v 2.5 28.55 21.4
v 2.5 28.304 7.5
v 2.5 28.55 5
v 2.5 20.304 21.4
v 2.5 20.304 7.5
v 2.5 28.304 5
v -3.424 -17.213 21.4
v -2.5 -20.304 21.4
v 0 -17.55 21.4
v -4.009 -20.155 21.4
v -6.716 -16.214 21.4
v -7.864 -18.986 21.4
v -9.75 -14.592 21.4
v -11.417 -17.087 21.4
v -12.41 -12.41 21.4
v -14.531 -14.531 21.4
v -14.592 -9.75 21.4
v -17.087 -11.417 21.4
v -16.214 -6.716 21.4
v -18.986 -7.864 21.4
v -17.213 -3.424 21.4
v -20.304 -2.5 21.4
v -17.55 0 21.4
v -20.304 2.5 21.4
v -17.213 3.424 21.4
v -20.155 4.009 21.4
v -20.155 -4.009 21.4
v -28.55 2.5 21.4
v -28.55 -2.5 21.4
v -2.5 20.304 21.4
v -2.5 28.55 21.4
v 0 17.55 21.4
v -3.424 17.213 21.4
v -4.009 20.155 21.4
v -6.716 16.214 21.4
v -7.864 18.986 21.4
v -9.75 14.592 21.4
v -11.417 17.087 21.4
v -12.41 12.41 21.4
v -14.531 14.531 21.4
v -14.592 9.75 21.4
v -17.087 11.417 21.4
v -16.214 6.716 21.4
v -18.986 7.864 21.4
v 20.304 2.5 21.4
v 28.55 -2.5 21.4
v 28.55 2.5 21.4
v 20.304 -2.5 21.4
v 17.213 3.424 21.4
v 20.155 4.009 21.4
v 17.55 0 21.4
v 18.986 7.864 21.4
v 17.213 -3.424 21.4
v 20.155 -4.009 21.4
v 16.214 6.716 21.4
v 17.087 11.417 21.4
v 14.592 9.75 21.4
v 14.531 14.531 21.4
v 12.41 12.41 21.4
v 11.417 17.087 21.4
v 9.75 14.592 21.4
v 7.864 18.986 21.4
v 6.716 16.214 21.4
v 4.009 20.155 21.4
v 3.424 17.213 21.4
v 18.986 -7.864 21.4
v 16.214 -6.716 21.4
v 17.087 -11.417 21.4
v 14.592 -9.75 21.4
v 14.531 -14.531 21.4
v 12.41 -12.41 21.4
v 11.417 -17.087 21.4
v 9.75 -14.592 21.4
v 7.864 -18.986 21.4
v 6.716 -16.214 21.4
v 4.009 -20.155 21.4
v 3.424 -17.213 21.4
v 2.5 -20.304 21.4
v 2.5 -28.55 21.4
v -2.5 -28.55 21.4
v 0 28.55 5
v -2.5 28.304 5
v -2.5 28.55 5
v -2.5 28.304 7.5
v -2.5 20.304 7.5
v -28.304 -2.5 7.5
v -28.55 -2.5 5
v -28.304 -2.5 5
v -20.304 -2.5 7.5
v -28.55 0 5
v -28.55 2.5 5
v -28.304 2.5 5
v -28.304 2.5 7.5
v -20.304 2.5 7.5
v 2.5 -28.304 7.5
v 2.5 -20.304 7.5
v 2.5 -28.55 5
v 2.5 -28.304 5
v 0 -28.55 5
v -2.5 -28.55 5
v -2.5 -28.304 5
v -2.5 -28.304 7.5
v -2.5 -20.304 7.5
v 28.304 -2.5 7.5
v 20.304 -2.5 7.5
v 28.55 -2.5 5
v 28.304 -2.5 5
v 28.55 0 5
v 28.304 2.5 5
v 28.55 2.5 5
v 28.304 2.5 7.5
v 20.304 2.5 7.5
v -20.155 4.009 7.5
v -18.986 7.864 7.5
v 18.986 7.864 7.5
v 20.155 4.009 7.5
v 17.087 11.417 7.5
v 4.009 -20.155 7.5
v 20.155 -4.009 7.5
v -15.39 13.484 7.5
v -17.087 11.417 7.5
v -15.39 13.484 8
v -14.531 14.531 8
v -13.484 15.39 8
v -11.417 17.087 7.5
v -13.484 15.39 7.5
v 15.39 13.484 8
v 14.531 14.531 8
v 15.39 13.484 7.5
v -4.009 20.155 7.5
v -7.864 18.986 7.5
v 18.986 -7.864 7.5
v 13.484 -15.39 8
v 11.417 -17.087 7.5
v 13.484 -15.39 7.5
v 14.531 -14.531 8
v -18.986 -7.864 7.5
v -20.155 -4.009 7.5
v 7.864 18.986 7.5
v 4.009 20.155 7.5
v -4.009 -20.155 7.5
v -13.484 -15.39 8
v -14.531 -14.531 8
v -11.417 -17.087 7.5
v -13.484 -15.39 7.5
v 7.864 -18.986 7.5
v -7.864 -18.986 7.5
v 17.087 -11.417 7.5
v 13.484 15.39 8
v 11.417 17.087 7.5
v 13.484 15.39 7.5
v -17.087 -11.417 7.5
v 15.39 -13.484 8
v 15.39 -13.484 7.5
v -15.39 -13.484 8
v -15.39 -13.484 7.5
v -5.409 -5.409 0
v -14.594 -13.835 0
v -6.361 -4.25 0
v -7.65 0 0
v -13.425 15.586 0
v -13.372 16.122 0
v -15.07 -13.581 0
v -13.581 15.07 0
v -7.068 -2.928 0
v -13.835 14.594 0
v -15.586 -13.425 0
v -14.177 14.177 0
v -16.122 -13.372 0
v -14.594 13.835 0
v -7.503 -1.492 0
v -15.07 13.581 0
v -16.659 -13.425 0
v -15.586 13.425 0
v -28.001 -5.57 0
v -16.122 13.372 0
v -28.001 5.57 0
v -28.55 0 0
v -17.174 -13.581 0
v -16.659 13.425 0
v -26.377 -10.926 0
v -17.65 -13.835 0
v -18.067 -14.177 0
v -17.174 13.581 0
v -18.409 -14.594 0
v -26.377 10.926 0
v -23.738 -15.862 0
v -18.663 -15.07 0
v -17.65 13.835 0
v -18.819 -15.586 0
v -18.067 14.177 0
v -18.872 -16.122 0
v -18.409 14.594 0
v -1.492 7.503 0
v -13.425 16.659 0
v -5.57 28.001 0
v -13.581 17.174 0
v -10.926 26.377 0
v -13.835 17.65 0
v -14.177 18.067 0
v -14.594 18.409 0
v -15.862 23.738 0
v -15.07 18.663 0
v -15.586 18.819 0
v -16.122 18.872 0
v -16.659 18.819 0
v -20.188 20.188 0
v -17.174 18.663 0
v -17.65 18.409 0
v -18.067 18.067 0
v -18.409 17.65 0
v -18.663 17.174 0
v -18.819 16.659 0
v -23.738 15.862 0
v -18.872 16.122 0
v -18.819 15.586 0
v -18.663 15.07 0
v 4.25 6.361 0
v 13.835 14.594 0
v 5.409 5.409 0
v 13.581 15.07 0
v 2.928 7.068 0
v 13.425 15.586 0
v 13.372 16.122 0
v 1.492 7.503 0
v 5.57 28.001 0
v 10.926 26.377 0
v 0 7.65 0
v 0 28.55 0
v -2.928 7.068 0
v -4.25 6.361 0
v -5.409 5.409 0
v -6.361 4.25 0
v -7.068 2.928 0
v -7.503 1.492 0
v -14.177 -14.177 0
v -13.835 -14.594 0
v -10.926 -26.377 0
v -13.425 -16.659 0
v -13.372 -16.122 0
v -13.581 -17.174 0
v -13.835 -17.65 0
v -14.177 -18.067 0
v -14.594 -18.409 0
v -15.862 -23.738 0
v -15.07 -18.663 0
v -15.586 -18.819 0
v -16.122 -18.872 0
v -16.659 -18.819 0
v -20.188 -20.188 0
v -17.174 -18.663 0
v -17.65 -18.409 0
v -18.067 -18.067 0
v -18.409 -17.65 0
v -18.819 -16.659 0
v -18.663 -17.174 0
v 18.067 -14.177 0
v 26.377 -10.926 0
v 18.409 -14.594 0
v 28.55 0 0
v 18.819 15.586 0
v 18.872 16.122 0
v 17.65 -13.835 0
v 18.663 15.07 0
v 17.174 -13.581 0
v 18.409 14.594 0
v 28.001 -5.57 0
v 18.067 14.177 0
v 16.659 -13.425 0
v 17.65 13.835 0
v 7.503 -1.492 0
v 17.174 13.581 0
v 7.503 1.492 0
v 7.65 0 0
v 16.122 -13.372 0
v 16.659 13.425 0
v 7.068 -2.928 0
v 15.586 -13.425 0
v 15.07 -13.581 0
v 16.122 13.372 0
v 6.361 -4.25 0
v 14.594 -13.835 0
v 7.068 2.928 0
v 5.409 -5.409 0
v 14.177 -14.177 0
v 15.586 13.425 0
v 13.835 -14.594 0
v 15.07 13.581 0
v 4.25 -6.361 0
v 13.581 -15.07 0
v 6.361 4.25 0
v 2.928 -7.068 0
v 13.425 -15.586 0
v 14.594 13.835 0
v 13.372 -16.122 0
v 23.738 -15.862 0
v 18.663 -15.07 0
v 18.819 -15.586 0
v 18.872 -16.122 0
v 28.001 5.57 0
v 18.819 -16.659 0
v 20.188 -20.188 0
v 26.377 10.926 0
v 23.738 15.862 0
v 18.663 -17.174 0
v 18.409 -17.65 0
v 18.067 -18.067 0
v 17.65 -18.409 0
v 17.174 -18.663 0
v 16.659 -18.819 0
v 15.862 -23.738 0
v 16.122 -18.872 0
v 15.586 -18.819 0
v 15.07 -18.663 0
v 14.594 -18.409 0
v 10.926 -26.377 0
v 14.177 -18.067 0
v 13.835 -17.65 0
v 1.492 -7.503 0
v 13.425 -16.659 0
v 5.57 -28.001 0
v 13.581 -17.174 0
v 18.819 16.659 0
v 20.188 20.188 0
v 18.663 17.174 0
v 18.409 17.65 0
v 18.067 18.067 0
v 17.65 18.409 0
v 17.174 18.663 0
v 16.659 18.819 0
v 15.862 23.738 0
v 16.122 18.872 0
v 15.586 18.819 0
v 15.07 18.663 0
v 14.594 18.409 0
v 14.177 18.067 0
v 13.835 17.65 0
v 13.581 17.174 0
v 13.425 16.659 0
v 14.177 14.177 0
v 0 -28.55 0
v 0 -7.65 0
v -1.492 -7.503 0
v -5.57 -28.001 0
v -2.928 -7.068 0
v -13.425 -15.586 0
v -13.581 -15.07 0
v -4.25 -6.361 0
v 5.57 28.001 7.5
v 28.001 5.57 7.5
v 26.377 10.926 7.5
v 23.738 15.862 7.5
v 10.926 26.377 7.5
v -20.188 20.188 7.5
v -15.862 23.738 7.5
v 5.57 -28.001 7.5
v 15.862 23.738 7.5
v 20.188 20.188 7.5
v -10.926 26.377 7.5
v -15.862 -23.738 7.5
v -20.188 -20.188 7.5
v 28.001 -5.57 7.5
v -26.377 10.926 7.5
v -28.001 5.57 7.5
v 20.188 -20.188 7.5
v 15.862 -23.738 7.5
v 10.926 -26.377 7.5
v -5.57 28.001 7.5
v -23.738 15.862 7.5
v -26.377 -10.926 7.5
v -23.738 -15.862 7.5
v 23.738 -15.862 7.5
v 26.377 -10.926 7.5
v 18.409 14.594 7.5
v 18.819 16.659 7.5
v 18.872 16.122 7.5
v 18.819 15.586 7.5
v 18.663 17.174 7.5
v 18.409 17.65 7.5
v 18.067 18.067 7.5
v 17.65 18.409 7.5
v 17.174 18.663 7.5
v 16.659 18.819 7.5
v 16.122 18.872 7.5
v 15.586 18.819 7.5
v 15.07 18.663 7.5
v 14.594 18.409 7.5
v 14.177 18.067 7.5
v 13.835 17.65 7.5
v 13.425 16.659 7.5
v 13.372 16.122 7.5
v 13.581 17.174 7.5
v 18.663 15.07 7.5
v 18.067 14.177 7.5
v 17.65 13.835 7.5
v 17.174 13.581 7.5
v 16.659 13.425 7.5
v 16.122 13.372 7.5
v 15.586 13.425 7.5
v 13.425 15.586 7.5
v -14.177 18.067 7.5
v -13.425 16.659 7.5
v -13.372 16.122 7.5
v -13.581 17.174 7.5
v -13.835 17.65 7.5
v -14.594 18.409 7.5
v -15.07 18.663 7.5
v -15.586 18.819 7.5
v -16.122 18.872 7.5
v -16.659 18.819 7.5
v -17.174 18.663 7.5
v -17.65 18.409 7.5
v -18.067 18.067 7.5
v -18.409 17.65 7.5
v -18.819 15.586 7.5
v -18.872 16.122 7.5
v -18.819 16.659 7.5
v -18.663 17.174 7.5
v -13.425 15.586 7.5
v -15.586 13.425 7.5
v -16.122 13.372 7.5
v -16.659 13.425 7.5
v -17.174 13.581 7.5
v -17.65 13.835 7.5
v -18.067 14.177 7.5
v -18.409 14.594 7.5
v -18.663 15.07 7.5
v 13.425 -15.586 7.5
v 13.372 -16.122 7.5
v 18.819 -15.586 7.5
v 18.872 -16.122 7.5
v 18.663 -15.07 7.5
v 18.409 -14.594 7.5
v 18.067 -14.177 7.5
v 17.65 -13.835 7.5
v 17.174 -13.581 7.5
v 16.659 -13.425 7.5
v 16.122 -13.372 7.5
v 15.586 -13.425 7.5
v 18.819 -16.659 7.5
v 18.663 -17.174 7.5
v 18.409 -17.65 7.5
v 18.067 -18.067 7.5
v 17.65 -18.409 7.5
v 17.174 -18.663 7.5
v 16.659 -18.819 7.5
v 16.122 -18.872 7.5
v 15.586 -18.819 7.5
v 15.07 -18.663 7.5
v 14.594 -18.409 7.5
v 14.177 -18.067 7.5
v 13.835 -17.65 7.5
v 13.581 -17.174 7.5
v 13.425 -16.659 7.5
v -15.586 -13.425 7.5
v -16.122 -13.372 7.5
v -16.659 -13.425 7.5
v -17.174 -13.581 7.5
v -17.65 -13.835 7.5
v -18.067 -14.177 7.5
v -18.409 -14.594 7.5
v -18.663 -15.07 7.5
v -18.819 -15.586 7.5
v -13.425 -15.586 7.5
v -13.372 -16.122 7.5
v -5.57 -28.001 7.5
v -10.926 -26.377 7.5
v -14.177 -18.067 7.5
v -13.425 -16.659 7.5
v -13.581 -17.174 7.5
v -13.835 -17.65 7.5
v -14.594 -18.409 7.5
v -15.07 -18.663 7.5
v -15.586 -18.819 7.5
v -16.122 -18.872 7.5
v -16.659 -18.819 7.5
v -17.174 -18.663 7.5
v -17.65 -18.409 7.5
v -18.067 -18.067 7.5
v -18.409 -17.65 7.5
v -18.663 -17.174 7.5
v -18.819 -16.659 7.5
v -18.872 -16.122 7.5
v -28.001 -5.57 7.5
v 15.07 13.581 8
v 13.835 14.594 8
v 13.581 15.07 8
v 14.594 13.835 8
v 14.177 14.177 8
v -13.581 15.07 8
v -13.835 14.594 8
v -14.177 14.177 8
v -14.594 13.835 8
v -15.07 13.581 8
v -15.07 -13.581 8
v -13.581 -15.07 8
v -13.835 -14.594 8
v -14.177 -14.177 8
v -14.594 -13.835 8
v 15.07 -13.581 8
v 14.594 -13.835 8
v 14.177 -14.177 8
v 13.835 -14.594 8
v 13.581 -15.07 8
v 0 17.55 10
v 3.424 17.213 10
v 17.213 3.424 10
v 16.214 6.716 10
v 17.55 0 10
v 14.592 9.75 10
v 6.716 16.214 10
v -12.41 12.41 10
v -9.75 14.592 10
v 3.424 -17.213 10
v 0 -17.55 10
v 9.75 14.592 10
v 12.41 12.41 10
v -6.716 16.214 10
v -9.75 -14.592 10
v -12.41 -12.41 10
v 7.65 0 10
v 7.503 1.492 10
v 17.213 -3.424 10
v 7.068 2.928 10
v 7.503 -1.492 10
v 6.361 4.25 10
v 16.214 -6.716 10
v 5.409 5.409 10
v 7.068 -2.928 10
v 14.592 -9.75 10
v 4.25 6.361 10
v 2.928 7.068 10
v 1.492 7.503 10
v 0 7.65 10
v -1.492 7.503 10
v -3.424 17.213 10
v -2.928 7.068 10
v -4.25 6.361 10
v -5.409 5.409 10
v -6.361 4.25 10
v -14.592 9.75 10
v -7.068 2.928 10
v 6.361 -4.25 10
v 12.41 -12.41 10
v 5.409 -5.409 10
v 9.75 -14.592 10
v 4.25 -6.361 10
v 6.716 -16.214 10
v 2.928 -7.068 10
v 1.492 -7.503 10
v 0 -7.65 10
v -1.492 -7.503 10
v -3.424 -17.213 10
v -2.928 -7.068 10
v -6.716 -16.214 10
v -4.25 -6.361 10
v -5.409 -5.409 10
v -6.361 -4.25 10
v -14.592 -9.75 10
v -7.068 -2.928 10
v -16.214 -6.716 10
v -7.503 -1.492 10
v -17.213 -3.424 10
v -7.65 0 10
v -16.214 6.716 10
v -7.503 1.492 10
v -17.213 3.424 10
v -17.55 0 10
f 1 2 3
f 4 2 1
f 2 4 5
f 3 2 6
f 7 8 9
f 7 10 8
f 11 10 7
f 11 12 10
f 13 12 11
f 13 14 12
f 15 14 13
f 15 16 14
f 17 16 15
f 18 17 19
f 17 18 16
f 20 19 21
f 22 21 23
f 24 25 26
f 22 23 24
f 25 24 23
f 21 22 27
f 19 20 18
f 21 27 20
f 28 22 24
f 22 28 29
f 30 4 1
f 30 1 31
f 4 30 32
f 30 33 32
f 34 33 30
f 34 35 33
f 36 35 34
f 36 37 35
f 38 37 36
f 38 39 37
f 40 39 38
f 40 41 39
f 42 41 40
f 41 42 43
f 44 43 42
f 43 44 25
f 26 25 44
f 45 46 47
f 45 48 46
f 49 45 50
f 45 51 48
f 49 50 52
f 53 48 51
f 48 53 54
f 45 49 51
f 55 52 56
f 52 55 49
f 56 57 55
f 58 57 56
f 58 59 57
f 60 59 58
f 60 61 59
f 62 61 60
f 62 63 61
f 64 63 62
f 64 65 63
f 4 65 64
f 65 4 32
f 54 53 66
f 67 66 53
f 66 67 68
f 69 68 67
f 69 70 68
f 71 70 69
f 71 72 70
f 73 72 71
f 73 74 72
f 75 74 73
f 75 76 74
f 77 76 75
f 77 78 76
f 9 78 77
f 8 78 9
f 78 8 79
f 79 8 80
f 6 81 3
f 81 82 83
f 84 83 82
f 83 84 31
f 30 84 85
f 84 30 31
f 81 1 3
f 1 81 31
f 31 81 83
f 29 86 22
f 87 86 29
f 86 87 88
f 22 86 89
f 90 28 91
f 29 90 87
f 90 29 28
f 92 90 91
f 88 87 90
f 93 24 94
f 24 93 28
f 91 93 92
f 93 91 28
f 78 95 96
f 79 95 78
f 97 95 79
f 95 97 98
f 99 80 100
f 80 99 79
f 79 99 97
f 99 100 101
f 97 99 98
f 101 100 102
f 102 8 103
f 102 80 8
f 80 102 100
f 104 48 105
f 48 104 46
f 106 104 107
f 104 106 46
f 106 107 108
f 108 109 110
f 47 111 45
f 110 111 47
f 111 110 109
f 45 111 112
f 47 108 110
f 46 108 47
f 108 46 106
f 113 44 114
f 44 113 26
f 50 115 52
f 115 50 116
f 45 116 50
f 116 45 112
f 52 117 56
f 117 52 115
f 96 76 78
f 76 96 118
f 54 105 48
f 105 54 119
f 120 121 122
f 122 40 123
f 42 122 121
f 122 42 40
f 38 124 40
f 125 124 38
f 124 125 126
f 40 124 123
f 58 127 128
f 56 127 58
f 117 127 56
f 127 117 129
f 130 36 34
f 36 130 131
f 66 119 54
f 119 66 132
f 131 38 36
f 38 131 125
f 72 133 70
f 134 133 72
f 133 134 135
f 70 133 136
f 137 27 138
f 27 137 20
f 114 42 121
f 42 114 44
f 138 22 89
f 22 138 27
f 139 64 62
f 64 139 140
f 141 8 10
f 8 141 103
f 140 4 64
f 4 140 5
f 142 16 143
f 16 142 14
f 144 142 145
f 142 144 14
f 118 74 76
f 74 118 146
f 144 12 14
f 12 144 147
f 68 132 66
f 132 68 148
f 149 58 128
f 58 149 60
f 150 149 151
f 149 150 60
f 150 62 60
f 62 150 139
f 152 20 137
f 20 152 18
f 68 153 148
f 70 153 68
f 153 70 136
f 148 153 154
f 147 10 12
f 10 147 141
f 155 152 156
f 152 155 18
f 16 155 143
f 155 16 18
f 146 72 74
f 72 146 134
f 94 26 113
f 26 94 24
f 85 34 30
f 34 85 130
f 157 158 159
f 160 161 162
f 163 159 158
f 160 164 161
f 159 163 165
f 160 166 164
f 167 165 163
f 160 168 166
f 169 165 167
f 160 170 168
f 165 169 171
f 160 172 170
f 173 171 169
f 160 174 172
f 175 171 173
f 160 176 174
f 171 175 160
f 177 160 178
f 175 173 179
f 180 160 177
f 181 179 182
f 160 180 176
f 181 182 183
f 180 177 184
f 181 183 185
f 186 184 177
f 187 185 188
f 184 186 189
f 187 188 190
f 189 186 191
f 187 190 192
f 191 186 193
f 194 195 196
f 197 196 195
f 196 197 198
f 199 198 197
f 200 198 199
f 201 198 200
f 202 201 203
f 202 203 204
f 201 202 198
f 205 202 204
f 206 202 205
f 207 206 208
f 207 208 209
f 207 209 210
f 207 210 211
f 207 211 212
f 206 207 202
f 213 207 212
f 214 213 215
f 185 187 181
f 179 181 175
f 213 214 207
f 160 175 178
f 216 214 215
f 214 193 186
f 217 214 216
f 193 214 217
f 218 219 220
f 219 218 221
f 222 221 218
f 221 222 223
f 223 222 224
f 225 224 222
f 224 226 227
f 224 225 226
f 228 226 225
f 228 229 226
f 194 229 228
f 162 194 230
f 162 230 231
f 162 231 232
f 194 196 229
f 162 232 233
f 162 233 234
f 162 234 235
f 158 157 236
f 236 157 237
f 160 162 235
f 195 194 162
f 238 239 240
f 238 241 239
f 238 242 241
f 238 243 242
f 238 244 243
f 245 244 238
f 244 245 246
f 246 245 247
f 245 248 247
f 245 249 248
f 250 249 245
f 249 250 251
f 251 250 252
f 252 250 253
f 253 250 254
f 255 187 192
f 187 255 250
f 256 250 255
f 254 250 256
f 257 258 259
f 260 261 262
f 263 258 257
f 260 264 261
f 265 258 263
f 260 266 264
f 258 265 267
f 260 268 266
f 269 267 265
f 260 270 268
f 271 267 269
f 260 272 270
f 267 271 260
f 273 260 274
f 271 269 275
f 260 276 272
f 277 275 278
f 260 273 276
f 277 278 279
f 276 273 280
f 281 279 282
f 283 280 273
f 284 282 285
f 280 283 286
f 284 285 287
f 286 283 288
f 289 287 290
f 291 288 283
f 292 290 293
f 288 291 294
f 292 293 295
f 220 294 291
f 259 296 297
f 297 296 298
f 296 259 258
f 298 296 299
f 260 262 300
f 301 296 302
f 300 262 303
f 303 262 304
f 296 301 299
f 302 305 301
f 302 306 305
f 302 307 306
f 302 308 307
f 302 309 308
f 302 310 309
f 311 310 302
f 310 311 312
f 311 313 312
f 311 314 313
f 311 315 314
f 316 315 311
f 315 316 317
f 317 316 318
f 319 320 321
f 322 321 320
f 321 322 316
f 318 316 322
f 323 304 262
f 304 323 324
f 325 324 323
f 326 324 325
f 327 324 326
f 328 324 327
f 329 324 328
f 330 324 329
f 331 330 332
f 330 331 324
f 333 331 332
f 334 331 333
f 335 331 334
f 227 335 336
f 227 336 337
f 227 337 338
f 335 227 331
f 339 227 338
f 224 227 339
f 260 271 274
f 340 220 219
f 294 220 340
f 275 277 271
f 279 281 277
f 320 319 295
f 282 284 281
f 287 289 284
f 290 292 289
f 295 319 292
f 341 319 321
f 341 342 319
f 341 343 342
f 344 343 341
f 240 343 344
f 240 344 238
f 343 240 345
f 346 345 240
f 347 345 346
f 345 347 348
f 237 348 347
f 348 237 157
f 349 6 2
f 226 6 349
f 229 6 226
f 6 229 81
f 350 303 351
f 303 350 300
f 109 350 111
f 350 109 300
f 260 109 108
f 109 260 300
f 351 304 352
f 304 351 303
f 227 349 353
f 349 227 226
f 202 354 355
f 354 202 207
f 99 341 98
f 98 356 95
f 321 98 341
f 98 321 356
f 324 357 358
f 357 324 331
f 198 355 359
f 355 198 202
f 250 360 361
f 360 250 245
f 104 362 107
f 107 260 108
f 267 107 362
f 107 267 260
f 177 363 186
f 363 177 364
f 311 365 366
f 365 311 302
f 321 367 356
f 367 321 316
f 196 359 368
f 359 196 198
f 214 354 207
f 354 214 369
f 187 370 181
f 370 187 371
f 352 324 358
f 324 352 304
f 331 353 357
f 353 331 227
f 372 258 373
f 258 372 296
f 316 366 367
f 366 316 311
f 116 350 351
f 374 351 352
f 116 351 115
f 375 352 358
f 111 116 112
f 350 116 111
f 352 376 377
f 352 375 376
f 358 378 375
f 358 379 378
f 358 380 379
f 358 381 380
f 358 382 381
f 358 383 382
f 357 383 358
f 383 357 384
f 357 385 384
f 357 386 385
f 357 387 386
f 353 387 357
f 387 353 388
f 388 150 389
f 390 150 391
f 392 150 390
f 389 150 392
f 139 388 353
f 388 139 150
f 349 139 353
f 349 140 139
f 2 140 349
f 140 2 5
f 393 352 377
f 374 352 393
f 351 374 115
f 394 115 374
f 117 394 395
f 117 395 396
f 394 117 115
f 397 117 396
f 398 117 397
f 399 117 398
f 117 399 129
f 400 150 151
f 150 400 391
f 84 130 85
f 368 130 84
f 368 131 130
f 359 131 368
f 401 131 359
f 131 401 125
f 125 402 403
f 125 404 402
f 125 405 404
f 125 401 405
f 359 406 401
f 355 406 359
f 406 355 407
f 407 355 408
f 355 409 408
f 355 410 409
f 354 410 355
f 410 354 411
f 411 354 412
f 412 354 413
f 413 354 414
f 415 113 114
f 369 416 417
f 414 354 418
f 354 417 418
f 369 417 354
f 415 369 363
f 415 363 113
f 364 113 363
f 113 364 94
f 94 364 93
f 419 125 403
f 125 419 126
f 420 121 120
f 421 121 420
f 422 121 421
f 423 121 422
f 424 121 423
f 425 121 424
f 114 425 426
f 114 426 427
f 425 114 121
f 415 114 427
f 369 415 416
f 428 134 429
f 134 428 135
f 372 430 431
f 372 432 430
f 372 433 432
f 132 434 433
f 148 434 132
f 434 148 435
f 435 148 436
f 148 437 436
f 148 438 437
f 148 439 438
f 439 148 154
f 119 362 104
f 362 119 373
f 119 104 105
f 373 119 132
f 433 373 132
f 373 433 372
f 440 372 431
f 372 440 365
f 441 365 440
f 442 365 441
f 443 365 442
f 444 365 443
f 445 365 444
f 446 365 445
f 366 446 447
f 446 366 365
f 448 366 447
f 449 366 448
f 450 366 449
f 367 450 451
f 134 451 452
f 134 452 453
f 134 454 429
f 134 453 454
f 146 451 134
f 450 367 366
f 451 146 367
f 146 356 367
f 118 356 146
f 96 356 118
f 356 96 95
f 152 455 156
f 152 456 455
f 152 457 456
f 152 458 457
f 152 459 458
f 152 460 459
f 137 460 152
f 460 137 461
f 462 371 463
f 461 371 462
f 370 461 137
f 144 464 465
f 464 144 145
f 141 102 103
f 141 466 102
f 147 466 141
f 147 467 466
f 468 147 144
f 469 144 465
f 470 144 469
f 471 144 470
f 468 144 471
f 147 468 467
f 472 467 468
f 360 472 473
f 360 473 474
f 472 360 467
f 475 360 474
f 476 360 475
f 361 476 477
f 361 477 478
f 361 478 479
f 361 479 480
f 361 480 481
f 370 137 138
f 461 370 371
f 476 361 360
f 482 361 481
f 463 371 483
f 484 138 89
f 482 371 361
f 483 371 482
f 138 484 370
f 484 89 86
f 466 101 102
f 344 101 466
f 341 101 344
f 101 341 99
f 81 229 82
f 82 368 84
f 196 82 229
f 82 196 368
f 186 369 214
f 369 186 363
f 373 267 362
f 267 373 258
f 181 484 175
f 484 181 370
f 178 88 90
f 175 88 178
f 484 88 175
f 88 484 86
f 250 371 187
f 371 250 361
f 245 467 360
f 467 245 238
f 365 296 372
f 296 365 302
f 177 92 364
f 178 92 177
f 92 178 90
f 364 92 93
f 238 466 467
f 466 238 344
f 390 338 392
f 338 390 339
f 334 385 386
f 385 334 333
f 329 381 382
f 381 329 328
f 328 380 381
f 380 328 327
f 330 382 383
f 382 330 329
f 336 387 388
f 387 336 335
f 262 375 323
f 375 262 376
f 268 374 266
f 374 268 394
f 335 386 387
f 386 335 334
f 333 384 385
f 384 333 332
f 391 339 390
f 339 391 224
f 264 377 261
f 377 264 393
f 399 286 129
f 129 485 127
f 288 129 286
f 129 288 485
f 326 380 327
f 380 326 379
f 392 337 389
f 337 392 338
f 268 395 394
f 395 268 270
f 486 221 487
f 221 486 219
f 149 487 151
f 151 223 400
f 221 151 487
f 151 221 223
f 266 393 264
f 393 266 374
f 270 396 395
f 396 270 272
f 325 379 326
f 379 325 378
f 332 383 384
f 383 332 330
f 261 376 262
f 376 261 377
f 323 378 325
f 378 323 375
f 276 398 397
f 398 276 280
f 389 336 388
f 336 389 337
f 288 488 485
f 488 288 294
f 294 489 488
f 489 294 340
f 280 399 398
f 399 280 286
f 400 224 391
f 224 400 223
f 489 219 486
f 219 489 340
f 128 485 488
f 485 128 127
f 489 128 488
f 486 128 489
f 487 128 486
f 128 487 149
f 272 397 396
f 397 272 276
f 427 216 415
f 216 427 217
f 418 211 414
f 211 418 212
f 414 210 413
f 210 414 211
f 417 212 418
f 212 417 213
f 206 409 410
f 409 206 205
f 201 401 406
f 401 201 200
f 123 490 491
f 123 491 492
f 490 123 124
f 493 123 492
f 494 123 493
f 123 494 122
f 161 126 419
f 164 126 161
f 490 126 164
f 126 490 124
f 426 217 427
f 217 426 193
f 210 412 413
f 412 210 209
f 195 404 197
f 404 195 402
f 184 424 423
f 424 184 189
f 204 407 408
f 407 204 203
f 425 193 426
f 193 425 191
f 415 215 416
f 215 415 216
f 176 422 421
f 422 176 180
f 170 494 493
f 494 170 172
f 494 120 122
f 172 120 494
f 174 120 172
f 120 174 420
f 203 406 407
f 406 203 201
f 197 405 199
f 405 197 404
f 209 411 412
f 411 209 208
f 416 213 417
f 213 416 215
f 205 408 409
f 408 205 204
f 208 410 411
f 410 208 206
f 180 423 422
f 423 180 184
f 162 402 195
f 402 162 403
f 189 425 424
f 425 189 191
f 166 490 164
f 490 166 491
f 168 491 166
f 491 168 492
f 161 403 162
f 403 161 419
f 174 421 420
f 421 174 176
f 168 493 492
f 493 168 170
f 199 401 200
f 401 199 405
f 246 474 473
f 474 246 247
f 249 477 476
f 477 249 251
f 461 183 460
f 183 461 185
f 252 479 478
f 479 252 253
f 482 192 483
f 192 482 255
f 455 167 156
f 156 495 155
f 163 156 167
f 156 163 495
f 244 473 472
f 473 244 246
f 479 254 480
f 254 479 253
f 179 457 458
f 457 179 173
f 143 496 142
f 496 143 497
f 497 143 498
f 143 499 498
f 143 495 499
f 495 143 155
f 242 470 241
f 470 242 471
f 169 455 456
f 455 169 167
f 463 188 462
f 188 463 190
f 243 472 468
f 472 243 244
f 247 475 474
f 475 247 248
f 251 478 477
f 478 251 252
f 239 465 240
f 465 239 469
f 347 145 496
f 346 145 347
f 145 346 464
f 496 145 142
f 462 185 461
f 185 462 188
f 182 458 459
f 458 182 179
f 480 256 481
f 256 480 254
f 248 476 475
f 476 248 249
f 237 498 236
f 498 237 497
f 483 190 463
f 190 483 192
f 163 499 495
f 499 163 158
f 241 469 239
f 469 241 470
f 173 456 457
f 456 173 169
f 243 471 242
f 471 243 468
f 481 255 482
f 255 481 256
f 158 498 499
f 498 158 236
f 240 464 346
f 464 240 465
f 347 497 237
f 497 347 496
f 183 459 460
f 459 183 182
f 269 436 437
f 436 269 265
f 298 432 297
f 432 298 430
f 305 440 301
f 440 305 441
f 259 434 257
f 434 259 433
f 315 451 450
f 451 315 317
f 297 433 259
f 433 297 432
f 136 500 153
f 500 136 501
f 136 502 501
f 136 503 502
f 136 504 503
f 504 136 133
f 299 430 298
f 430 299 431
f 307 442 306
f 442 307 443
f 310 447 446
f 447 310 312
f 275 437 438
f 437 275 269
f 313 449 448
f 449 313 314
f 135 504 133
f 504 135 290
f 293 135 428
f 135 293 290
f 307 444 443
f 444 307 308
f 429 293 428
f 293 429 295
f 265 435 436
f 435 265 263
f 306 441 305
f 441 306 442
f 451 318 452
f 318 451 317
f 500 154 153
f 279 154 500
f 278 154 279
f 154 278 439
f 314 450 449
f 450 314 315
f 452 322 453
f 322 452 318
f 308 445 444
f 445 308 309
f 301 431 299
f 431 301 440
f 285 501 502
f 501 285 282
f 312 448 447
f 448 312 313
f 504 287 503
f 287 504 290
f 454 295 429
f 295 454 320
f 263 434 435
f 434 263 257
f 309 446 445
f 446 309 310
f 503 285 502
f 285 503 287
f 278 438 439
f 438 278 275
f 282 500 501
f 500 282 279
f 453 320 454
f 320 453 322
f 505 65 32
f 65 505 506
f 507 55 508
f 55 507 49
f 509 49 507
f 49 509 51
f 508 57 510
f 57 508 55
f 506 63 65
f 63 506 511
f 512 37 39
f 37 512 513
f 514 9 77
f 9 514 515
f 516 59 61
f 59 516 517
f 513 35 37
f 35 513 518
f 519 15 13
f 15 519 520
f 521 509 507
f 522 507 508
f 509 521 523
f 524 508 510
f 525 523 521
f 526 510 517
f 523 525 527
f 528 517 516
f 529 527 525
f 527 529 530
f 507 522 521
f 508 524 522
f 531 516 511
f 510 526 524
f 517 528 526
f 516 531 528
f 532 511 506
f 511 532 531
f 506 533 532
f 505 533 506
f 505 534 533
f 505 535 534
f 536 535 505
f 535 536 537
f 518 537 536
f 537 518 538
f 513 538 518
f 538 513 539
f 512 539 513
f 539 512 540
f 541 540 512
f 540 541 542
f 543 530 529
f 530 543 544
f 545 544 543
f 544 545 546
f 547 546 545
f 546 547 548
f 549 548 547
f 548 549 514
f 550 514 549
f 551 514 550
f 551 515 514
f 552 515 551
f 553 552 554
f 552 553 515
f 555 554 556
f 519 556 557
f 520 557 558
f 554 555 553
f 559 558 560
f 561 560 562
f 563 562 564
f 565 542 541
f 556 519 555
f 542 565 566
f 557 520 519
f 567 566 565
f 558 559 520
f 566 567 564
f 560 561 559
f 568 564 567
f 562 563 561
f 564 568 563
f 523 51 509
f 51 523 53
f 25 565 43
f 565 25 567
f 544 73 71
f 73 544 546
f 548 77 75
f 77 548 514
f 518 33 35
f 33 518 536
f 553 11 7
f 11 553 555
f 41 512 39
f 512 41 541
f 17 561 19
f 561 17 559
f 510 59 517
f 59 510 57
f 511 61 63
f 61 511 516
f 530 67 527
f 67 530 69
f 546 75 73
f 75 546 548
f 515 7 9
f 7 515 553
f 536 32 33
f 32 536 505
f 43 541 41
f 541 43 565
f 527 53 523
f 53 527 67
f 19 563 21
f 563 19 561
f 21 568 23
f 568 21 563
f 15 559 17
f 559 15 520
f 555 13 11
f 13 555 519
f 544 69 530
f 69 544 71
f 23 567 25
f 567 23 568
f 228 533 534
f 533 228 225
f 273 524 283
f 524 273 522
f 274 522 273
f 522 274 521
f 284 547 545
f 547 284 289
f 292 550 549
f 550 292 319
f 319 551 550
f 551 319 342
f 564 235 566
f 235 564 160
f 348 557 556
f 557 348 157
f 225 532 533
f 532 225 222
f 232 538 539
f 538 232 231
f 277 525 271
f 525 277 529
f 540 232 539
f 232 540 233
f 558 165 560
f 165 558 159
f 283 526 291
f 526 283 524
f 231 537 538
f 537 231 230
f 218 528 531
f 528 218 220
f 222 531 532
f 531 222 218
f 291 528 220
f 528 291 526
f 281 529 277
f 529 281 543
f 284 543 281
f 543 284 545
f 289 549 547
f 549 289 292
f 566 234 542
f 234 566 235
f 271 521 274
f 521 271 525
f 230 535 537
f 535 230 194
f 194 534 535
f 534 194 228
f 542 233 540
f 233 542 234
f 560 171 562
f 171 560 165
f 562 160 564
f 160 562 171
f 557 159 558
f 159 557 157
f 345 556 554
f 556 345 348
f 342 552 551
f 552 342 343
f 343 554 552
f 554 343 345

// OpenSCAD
$fn = 32;

// ----------------------------------------------------------------------
// Bearing housing: seat for 6202 (35 x 11 mm), 41.1 mm body
// ----------------------------------------------------------------------

// --- parameters (mm) ---
case_d = 41.1;            // housing outside diameter
case_h = 21.4;            // overall housing height
rim_t = 3;                // wall thickness
bearing_seat = 35.1;      // 6202 seat, 0.1 mm clearance
seat_h = 11.4;            // pocket depth
shoulder = 4;             // shoulder under the bearing
pass_d = 15.3;            // shaft passage
ear_d = 57.1;             // mounting flange diameter
flange_t = 6;             // flange thickness
bolt_d = 5.5;             // flange bolt clearance
bolt_r = 22.8;            // flange bolt circle radius
rib_w = 5;                // rib width
rib_n = 4;                // rib count

module body() {
  cylinder(h = case_h, d = case_d);
}

module flange() {
  /* flange sunk 1.5 mm into the body */
  cylinder(h = flange_t + 1.5, d = ear_d);
}

module ribs() {
  for (i = [0 : rib_n - 1])
    rotate([0, 0, i * 360 / rib_n])
      translate([-rib_w / 2, case_d / 2 - 0.8, flange_t - 1])
        cube([rib_w, (ear_d - case_d) / 2 + 0.8, case_h - flange_t + 1]);
}

difference() {
  union() {
    body();
    flange();
    ribs();
  }
  translate([0, 0, case_h - seat_h]) cylinder(h = seat_h + 1, d = bearing_seat);
  translate([0, 0, -1]) cylinder(h = case_h - seat_h + 1, d = pass_d);
  for (i = [0 : 3]) rotate([0, 0, 45 + i * 90]) translate([bolt_r, 0, -1])
    cylinder(h = flange_t + 3, d = bolt_d);
}
